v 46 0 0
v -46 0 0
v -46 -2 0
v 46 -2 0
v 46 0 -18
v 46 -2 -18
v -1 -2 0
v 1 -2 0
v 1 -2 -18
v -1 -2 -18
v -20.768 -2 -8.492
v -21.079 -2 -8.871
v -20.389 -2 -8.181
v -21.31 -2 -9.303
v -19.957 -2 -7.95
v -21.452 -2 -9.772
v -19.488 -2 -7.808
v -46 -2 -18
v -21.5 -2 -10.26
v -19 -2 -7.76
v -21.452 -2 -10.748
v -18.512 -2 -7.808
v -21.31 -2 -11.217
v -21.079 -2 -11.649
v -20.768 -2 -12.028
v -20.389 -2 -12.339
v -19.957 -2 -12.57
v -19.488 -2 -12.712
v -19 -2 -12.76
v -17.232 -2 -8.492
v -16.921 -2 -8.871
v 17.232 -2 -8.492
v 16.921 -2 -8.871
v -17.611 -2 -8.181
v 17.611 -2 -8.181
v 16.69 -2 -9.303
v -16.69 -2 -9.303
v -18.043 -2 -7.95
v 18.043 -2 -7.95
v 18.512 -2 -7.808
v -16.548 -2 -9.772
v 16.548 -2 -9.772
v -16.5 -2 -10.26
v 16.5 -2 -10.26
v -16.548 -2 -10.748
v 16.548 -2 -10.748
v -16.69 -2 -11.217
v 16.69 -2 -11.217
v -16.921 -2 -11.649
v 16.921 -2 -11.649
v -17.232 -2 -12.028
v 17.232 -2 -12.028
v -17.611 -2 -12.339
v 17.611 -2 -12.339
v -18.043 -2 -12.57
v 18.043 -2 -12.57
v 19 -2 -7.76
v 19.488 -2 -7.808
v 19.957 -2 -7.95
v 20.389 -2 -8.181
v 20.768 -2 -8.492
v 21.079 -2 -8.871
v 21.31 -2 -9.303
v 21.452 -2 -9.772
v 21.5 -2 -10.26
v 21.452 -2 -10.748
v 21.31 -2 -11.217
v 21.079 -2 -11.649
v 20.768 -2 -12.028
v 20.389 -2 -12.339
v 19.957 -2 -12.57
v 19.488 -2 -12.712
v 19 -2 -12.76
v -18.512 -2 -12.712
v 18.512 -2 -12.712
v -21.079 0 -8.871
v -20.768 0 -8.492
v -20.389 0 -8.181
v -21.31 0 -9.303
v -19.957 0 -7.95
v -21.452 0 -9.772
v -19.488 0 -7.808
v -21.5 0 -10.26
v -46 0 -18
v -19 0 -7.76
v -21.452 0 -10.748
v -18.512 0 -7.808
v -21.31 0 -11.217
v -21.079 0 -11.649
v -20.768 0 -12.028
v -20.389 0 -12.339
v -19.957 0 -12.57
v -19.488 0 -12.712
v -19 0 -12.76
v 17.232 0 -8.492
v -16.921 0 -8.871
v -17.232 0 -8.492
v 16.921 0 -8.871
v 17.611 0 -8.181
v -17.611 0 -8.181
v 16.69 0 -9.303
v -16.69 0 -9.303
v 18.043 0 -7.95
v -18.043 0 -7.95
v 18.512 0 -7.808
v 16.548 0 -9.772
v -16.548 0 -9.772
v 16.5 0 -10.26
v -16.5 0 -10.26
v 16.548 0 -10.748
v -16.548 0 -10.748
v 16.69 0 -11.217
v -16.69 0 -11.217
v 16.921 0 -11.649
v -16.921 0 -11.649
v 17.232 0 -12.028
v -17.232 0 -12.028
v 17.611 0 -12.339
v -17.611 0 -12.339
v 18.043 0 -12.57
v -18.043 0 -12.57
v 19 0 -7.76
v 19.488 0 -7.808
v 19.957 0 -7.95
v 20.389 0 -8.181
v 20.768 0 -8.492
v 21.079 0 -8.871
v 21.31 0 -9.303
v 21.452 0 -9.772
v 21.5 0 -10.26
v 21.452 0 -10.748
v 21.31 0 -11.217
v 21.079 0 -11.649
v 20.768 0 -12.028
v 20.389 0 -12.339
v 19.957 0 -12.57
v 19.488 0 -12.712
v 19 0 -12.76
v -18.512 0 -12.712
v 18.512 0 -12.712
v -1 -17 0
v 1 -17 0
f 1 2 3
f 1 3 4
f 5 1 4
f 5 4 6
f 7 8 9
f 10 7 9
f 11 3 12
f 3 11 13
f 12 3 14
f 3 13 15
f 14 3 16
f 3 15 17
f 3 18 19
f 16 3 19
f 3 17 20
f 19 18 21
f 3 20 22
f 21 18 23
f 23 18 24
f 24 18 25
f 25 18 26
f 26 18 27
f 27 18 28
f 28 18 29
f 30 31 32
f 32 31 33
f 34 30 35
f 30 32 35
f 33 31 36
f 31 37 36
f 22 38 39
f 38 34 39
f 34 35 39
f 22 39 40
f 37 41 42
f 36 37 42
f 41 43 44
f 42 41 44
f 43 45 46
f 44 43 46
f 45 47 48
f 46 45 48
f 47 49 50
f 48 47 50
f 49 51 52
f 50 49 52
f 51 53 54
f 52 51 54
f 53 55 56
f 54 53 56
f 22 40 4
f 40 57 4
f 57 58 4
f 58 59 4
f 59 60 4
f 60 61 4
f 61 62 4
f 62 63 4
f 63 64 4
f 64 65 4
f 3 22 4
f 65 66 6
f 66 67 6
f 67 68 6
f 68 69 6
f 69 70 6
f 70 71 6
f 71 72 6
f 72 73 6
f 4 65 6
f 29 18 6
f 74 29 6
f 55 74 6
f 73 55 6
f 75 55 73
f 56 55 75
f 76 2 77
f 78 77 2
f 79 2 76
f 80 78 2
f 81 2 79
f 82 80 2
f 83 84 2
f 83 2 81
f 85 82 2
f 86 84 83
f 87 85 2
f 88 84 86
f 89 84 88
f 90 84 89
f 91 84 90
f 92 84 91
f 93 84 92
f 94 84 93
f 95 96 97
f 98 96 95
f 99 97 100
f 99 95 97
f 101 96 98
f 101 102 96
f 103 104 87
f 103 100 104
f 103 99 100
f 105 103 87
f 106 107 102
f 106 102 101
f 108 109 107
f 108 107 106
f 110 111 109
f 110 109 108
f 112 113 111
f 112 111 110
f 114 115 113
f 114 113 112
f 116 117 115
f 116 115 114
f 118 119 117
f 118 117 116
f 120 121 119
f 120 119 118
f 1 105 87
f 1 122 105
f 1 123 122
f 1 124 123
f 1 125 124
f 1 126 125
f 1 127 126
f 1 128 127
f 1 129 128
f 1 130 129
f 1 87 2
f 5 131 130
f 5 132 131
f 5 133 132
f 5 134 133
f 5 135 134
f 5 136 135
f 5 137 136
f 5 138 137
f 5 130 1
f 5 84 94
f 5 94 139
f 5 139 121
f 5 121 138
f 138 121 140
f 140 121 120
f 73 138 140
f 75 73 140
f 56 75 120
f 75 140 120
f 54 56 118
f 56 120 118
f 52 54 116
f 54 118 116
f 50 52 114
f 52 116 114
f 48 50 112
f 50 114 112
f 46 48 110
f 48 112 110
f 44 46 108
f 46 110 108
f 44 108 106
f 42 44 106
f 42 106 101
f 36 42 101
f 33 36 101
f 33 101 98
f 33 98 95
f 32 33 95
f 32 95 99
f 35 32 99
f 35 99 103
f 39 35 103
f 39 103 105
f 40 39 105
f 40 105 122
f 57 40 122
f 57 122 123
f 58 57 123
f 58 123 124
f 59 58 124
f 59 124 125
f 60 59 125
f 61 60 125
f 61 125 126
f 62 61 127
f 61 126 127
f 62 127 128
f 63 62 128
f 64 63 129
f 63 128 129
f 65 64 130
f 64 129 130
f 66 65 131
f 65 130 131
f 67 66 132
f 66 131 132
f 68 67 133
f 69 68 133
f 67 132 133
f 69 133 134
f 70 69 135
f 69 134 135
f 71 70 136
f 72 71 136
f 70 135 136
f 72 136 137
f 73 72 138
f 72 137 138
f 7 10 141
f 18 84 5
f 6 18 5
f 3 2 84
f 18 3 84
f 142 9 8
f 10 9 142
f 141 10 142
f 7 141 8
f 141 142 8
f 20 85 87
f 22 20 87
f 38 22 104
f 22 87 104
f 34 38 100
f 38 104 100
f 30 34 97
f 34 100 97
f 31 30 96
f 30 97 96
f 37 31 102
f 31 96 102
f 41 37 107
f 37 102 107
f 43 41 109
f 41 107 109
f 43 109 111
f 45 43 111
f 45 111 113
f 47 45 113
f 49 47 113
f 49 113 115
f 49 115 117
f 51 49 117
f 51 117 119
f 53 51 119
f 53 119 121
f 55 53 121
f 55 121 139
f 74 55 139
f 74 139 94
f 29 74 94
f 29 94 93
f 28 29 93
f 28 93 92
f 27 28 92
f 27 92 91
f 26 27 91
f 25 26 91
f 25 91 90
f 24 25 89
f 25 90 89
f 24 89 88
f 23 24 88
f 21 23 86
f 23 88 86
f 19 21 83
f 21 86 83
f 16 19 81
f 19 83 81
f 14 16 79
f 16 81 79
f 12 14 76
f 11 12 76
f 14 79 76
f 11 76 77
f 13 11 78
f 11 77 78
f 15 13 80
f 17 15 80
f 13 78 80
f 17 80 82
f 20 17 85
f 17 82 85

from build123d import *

# Parameters (mm, degrees)
SKETCH1_W           = 92
SKETCH1_H           = 18
BASE_FLANGE1_DEPTH  = 2
SKETCH11_R          = 2.5
CUT_EXTRUDE1_DEPTH  = 10
BOSS_EXTRUDE1_DEPTH = 1


# Sheet-metal steps are written as plain solids
with BuildPart() as part:
    # Sketch1 → Base-Flange1 (new body)
    with BuildSketch(Plane(origin=(0, 0, 0), x_dir=(1, 0, 0), z_dir=(0, 1, 0))):
        with Locations((0, 9)):
            Rectangle(SKETCH1_W, SKETCH1_H)
    extrude(amount=-BASE_FLANGE1_DEPTH)

    # Sketch11 → Cut-Extrude1 (cut)
    with BuildSketch(Plane(origin=(0, 0, 0), x_dir=(1, 0, 0), z_dir=(0, 1, 0))):
        with Locations(Location((-19, 10.26, 0), (0, 0, 270))):
            Circle(SKETCH11_R)
        with Locations(Location((19, 10.26, 0), (0, 0, 90))):
            Circle(SKETCH11_R)
    extrude(amount=-CUT_EXTRUDE1_DEPTH, mode=Mode.SUBTRACT)


with BuildPart() as body_2:
    # Sketch12 → Boss-Extrude1 (new, symmetric)
    with BuildSketch(Plane(origin=(0, 0, 0), x_dir=(0, 0, -1), z_dir=(1, 0, 0))):
        Polygon((18, -2), (0, -17), (0, -2), align=None)
    extrude(amount=BOSS_EXTRUDE1_DEPTH, both=True)


solid = Compound([part.part, body_2.part])
